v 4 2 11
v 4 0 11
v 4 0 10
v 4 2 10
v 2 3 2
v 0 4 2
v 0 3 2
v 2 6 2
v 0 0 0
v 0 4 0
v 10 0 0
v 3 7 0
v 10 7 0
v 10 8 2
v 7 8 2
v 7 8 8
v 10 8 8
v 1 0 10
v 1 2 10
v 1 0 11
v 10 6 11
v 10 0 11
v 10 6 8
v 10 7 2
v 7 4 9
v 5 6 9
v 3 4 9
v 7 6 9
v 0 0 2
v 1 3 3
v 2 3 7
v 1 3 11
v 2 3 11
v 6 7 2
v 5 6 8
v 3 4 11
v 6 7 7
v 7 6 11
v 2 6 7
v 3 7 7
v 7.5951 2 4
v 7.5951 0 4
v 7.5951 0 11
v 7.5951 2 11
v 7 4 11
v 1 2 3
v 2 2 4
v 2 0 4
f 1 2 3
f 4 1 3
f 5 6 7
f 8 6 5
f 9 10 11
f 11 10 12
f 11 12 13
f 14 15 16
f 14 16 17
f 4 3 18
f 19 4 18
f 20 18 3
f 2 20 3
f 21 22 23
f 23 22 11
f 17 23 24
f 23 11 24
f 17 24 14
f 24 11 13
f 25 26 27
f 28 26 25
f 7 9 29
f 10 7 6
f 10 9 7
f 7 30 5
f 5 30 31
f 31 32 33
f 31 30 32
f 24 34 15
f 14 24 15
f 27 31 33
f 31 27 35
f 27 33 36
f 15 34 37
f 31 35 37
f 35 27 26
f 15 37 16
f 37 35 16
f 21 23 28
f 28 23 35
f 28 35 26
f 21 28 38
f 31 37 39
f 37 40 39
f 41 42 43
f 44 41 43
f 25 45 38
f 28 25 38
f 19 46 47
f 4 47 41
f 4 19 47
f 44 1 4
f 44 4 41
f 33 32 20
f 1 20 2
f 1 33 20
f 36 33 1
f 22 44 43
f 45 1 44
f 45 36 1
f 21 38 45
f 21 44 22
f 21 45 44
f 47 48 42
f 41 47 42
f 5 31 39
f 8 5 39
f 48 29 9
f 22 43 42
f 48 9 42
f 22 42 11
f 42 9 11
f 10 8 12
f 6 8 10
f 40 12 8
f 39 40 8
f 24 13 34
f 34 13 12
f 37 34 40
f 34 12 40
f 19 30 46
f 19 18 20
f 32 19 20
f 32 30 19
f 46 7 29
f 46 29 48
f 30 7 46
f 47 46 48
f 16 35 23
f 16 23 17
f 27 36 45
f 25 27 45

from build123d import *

# Parameters (mm, degrees)
SKETCH1_W           = 10
SKETCH1_H           = 8
BOSS_EXTRUDE1_DEPTH = 11
SKETCH2_W           = 2
SKETCH2_H           = 1
SKETCH2_W_2         = 3
SKETCH2_H_2         = 2
CUT_EXTRUDE1_DEPTH  = 11
SKETCH3_W           = 4
SKETCH3_H           = 2
CUT_EXTRUDE2_DEPTH  = 2
CUT_EXTRUDE3_DEPTH  = 4
SKETCH5_W           = 2
SKETCH5_H           = 1
CUT_EXTRUDE4_DEPTH  = 5
SKETCH6_W           = 2
SKETCH6_H           = 5
CUT_EXTRUDE5_DEPTH  = 9
CUT_EXTRUDE6_DEPTH  = 7
CUT_EXTRUDE7_DEPTH  = 7
CUT_EXTRUDE8_DEPTH  = 2


with BuildPart() as part:
    # Sketch1 → Boss-Extrude1 (new body)
    with BuildSketch(Plane.XY):
        with Locations((5, 4)):
            Rectangle(SKETCH1_W, SKETCH1_H)
    extrude(amount=BOSS_EXTRUDE1_DEPTH)

    # Sketch2 → Cut-Extrude1 (cut)
    with BuildSketch(Plane.ZY):
        with Locations((1, 7.5)):
            Rectangle(SKETCH2_W, SKETCH2_H)
        with Locations((9.5, 7)):
            Rectangle(SKETCH2_W_2, SKETCH2_H_2)
    extrude(amount=-CUT_EXTRUDE1_DEPTH, mode=Mode.SUBTRACT)

    # Sketch3 → Cut-Extrude2 (cut)
    with BuildSketch(Plane.XY.offset(11)):
        with Locations((5, 5)):
            Rectangle(SKETCH3_W, SKETCH3_H)
    extrude(amount=-CUT_EXTRUDE2_DEPTH, mode=Mode.SUBTRACT)

    # Sketch4 → Cut-Extrude3 (cut)
    with BuildSketch(Plane.XY.offset(11)):
        Polygon((3, 4), (2, 3), (2, 8), (7, 8), align=None)
    extrude(amount=-CUT_EXTRUDE3_DEPTH, mode=Mode.SUBTRACT)

    # Sketch5 → Cut-Extrude4 (cut)
    with BuildSketch(Plane.XY.offset(7)):
        Polygon((6, 7), (7, 8), (2, 8), (2, 7), align=None)
        with Locations((1, 7.5)):
            Rectangle(SKETCH5_W, SKETCH5_H)
    extrude(amount=-CUT_EXTRUDE4_DEPTH, mode=Mode.SUBTRACT)

    # Sketch6 → Cut-Extrude5 (cut)
    with BuildSketch(Plane.XY.offset(11)):
        with Locations((1, 5.5)):
            Rectangle(SKETCH6_W, SKETCH6_H)
    extrude(amount=-CUT_EXTRUDE5_DEPTH, mode=Mode.SUBTRACT)

    # Sketch7 → Cut-Extrude6 (cut)
    with BuildSketch(Plane.XY.offset(7)):
        Polygon((3, 7), (0, 4), (0, 7), align=None)
    extrude(amount=-CUT_EXTRUDE6_DEPTH, mode=Mode.SUBTRACT)

    # Sketch9 → Cut-Extrude7 (cut)
    with BuildSketch(Plane(origin=(0, 3, 0), x_dir=(1, 0, 0), z_dir=(0, 1, 0))):
        Polygon((0, -2), (1, -3), (1, -11), (0, -11), align=None)
    extrude(amount=-CUT_EXTRUDE7_DEPTH, mode=Mode.SUBTRACT)

    # Sketch10 → Cut-Extrude8 (cut)
    with BuildSketch(Plane.XZ):
        Polygon((1, 3), (2, 4), (7.595103791, 4), (7.595103791, 9.328283849), (7.595103791, 11), (4, 11), (4, 10), (1, 10), (1, 4.286480229), align=None)
    extrude(amount=-CUT_EXTRUDE8_DEPTH, mode=Mode.SUBTRACT)


solid = part.part
